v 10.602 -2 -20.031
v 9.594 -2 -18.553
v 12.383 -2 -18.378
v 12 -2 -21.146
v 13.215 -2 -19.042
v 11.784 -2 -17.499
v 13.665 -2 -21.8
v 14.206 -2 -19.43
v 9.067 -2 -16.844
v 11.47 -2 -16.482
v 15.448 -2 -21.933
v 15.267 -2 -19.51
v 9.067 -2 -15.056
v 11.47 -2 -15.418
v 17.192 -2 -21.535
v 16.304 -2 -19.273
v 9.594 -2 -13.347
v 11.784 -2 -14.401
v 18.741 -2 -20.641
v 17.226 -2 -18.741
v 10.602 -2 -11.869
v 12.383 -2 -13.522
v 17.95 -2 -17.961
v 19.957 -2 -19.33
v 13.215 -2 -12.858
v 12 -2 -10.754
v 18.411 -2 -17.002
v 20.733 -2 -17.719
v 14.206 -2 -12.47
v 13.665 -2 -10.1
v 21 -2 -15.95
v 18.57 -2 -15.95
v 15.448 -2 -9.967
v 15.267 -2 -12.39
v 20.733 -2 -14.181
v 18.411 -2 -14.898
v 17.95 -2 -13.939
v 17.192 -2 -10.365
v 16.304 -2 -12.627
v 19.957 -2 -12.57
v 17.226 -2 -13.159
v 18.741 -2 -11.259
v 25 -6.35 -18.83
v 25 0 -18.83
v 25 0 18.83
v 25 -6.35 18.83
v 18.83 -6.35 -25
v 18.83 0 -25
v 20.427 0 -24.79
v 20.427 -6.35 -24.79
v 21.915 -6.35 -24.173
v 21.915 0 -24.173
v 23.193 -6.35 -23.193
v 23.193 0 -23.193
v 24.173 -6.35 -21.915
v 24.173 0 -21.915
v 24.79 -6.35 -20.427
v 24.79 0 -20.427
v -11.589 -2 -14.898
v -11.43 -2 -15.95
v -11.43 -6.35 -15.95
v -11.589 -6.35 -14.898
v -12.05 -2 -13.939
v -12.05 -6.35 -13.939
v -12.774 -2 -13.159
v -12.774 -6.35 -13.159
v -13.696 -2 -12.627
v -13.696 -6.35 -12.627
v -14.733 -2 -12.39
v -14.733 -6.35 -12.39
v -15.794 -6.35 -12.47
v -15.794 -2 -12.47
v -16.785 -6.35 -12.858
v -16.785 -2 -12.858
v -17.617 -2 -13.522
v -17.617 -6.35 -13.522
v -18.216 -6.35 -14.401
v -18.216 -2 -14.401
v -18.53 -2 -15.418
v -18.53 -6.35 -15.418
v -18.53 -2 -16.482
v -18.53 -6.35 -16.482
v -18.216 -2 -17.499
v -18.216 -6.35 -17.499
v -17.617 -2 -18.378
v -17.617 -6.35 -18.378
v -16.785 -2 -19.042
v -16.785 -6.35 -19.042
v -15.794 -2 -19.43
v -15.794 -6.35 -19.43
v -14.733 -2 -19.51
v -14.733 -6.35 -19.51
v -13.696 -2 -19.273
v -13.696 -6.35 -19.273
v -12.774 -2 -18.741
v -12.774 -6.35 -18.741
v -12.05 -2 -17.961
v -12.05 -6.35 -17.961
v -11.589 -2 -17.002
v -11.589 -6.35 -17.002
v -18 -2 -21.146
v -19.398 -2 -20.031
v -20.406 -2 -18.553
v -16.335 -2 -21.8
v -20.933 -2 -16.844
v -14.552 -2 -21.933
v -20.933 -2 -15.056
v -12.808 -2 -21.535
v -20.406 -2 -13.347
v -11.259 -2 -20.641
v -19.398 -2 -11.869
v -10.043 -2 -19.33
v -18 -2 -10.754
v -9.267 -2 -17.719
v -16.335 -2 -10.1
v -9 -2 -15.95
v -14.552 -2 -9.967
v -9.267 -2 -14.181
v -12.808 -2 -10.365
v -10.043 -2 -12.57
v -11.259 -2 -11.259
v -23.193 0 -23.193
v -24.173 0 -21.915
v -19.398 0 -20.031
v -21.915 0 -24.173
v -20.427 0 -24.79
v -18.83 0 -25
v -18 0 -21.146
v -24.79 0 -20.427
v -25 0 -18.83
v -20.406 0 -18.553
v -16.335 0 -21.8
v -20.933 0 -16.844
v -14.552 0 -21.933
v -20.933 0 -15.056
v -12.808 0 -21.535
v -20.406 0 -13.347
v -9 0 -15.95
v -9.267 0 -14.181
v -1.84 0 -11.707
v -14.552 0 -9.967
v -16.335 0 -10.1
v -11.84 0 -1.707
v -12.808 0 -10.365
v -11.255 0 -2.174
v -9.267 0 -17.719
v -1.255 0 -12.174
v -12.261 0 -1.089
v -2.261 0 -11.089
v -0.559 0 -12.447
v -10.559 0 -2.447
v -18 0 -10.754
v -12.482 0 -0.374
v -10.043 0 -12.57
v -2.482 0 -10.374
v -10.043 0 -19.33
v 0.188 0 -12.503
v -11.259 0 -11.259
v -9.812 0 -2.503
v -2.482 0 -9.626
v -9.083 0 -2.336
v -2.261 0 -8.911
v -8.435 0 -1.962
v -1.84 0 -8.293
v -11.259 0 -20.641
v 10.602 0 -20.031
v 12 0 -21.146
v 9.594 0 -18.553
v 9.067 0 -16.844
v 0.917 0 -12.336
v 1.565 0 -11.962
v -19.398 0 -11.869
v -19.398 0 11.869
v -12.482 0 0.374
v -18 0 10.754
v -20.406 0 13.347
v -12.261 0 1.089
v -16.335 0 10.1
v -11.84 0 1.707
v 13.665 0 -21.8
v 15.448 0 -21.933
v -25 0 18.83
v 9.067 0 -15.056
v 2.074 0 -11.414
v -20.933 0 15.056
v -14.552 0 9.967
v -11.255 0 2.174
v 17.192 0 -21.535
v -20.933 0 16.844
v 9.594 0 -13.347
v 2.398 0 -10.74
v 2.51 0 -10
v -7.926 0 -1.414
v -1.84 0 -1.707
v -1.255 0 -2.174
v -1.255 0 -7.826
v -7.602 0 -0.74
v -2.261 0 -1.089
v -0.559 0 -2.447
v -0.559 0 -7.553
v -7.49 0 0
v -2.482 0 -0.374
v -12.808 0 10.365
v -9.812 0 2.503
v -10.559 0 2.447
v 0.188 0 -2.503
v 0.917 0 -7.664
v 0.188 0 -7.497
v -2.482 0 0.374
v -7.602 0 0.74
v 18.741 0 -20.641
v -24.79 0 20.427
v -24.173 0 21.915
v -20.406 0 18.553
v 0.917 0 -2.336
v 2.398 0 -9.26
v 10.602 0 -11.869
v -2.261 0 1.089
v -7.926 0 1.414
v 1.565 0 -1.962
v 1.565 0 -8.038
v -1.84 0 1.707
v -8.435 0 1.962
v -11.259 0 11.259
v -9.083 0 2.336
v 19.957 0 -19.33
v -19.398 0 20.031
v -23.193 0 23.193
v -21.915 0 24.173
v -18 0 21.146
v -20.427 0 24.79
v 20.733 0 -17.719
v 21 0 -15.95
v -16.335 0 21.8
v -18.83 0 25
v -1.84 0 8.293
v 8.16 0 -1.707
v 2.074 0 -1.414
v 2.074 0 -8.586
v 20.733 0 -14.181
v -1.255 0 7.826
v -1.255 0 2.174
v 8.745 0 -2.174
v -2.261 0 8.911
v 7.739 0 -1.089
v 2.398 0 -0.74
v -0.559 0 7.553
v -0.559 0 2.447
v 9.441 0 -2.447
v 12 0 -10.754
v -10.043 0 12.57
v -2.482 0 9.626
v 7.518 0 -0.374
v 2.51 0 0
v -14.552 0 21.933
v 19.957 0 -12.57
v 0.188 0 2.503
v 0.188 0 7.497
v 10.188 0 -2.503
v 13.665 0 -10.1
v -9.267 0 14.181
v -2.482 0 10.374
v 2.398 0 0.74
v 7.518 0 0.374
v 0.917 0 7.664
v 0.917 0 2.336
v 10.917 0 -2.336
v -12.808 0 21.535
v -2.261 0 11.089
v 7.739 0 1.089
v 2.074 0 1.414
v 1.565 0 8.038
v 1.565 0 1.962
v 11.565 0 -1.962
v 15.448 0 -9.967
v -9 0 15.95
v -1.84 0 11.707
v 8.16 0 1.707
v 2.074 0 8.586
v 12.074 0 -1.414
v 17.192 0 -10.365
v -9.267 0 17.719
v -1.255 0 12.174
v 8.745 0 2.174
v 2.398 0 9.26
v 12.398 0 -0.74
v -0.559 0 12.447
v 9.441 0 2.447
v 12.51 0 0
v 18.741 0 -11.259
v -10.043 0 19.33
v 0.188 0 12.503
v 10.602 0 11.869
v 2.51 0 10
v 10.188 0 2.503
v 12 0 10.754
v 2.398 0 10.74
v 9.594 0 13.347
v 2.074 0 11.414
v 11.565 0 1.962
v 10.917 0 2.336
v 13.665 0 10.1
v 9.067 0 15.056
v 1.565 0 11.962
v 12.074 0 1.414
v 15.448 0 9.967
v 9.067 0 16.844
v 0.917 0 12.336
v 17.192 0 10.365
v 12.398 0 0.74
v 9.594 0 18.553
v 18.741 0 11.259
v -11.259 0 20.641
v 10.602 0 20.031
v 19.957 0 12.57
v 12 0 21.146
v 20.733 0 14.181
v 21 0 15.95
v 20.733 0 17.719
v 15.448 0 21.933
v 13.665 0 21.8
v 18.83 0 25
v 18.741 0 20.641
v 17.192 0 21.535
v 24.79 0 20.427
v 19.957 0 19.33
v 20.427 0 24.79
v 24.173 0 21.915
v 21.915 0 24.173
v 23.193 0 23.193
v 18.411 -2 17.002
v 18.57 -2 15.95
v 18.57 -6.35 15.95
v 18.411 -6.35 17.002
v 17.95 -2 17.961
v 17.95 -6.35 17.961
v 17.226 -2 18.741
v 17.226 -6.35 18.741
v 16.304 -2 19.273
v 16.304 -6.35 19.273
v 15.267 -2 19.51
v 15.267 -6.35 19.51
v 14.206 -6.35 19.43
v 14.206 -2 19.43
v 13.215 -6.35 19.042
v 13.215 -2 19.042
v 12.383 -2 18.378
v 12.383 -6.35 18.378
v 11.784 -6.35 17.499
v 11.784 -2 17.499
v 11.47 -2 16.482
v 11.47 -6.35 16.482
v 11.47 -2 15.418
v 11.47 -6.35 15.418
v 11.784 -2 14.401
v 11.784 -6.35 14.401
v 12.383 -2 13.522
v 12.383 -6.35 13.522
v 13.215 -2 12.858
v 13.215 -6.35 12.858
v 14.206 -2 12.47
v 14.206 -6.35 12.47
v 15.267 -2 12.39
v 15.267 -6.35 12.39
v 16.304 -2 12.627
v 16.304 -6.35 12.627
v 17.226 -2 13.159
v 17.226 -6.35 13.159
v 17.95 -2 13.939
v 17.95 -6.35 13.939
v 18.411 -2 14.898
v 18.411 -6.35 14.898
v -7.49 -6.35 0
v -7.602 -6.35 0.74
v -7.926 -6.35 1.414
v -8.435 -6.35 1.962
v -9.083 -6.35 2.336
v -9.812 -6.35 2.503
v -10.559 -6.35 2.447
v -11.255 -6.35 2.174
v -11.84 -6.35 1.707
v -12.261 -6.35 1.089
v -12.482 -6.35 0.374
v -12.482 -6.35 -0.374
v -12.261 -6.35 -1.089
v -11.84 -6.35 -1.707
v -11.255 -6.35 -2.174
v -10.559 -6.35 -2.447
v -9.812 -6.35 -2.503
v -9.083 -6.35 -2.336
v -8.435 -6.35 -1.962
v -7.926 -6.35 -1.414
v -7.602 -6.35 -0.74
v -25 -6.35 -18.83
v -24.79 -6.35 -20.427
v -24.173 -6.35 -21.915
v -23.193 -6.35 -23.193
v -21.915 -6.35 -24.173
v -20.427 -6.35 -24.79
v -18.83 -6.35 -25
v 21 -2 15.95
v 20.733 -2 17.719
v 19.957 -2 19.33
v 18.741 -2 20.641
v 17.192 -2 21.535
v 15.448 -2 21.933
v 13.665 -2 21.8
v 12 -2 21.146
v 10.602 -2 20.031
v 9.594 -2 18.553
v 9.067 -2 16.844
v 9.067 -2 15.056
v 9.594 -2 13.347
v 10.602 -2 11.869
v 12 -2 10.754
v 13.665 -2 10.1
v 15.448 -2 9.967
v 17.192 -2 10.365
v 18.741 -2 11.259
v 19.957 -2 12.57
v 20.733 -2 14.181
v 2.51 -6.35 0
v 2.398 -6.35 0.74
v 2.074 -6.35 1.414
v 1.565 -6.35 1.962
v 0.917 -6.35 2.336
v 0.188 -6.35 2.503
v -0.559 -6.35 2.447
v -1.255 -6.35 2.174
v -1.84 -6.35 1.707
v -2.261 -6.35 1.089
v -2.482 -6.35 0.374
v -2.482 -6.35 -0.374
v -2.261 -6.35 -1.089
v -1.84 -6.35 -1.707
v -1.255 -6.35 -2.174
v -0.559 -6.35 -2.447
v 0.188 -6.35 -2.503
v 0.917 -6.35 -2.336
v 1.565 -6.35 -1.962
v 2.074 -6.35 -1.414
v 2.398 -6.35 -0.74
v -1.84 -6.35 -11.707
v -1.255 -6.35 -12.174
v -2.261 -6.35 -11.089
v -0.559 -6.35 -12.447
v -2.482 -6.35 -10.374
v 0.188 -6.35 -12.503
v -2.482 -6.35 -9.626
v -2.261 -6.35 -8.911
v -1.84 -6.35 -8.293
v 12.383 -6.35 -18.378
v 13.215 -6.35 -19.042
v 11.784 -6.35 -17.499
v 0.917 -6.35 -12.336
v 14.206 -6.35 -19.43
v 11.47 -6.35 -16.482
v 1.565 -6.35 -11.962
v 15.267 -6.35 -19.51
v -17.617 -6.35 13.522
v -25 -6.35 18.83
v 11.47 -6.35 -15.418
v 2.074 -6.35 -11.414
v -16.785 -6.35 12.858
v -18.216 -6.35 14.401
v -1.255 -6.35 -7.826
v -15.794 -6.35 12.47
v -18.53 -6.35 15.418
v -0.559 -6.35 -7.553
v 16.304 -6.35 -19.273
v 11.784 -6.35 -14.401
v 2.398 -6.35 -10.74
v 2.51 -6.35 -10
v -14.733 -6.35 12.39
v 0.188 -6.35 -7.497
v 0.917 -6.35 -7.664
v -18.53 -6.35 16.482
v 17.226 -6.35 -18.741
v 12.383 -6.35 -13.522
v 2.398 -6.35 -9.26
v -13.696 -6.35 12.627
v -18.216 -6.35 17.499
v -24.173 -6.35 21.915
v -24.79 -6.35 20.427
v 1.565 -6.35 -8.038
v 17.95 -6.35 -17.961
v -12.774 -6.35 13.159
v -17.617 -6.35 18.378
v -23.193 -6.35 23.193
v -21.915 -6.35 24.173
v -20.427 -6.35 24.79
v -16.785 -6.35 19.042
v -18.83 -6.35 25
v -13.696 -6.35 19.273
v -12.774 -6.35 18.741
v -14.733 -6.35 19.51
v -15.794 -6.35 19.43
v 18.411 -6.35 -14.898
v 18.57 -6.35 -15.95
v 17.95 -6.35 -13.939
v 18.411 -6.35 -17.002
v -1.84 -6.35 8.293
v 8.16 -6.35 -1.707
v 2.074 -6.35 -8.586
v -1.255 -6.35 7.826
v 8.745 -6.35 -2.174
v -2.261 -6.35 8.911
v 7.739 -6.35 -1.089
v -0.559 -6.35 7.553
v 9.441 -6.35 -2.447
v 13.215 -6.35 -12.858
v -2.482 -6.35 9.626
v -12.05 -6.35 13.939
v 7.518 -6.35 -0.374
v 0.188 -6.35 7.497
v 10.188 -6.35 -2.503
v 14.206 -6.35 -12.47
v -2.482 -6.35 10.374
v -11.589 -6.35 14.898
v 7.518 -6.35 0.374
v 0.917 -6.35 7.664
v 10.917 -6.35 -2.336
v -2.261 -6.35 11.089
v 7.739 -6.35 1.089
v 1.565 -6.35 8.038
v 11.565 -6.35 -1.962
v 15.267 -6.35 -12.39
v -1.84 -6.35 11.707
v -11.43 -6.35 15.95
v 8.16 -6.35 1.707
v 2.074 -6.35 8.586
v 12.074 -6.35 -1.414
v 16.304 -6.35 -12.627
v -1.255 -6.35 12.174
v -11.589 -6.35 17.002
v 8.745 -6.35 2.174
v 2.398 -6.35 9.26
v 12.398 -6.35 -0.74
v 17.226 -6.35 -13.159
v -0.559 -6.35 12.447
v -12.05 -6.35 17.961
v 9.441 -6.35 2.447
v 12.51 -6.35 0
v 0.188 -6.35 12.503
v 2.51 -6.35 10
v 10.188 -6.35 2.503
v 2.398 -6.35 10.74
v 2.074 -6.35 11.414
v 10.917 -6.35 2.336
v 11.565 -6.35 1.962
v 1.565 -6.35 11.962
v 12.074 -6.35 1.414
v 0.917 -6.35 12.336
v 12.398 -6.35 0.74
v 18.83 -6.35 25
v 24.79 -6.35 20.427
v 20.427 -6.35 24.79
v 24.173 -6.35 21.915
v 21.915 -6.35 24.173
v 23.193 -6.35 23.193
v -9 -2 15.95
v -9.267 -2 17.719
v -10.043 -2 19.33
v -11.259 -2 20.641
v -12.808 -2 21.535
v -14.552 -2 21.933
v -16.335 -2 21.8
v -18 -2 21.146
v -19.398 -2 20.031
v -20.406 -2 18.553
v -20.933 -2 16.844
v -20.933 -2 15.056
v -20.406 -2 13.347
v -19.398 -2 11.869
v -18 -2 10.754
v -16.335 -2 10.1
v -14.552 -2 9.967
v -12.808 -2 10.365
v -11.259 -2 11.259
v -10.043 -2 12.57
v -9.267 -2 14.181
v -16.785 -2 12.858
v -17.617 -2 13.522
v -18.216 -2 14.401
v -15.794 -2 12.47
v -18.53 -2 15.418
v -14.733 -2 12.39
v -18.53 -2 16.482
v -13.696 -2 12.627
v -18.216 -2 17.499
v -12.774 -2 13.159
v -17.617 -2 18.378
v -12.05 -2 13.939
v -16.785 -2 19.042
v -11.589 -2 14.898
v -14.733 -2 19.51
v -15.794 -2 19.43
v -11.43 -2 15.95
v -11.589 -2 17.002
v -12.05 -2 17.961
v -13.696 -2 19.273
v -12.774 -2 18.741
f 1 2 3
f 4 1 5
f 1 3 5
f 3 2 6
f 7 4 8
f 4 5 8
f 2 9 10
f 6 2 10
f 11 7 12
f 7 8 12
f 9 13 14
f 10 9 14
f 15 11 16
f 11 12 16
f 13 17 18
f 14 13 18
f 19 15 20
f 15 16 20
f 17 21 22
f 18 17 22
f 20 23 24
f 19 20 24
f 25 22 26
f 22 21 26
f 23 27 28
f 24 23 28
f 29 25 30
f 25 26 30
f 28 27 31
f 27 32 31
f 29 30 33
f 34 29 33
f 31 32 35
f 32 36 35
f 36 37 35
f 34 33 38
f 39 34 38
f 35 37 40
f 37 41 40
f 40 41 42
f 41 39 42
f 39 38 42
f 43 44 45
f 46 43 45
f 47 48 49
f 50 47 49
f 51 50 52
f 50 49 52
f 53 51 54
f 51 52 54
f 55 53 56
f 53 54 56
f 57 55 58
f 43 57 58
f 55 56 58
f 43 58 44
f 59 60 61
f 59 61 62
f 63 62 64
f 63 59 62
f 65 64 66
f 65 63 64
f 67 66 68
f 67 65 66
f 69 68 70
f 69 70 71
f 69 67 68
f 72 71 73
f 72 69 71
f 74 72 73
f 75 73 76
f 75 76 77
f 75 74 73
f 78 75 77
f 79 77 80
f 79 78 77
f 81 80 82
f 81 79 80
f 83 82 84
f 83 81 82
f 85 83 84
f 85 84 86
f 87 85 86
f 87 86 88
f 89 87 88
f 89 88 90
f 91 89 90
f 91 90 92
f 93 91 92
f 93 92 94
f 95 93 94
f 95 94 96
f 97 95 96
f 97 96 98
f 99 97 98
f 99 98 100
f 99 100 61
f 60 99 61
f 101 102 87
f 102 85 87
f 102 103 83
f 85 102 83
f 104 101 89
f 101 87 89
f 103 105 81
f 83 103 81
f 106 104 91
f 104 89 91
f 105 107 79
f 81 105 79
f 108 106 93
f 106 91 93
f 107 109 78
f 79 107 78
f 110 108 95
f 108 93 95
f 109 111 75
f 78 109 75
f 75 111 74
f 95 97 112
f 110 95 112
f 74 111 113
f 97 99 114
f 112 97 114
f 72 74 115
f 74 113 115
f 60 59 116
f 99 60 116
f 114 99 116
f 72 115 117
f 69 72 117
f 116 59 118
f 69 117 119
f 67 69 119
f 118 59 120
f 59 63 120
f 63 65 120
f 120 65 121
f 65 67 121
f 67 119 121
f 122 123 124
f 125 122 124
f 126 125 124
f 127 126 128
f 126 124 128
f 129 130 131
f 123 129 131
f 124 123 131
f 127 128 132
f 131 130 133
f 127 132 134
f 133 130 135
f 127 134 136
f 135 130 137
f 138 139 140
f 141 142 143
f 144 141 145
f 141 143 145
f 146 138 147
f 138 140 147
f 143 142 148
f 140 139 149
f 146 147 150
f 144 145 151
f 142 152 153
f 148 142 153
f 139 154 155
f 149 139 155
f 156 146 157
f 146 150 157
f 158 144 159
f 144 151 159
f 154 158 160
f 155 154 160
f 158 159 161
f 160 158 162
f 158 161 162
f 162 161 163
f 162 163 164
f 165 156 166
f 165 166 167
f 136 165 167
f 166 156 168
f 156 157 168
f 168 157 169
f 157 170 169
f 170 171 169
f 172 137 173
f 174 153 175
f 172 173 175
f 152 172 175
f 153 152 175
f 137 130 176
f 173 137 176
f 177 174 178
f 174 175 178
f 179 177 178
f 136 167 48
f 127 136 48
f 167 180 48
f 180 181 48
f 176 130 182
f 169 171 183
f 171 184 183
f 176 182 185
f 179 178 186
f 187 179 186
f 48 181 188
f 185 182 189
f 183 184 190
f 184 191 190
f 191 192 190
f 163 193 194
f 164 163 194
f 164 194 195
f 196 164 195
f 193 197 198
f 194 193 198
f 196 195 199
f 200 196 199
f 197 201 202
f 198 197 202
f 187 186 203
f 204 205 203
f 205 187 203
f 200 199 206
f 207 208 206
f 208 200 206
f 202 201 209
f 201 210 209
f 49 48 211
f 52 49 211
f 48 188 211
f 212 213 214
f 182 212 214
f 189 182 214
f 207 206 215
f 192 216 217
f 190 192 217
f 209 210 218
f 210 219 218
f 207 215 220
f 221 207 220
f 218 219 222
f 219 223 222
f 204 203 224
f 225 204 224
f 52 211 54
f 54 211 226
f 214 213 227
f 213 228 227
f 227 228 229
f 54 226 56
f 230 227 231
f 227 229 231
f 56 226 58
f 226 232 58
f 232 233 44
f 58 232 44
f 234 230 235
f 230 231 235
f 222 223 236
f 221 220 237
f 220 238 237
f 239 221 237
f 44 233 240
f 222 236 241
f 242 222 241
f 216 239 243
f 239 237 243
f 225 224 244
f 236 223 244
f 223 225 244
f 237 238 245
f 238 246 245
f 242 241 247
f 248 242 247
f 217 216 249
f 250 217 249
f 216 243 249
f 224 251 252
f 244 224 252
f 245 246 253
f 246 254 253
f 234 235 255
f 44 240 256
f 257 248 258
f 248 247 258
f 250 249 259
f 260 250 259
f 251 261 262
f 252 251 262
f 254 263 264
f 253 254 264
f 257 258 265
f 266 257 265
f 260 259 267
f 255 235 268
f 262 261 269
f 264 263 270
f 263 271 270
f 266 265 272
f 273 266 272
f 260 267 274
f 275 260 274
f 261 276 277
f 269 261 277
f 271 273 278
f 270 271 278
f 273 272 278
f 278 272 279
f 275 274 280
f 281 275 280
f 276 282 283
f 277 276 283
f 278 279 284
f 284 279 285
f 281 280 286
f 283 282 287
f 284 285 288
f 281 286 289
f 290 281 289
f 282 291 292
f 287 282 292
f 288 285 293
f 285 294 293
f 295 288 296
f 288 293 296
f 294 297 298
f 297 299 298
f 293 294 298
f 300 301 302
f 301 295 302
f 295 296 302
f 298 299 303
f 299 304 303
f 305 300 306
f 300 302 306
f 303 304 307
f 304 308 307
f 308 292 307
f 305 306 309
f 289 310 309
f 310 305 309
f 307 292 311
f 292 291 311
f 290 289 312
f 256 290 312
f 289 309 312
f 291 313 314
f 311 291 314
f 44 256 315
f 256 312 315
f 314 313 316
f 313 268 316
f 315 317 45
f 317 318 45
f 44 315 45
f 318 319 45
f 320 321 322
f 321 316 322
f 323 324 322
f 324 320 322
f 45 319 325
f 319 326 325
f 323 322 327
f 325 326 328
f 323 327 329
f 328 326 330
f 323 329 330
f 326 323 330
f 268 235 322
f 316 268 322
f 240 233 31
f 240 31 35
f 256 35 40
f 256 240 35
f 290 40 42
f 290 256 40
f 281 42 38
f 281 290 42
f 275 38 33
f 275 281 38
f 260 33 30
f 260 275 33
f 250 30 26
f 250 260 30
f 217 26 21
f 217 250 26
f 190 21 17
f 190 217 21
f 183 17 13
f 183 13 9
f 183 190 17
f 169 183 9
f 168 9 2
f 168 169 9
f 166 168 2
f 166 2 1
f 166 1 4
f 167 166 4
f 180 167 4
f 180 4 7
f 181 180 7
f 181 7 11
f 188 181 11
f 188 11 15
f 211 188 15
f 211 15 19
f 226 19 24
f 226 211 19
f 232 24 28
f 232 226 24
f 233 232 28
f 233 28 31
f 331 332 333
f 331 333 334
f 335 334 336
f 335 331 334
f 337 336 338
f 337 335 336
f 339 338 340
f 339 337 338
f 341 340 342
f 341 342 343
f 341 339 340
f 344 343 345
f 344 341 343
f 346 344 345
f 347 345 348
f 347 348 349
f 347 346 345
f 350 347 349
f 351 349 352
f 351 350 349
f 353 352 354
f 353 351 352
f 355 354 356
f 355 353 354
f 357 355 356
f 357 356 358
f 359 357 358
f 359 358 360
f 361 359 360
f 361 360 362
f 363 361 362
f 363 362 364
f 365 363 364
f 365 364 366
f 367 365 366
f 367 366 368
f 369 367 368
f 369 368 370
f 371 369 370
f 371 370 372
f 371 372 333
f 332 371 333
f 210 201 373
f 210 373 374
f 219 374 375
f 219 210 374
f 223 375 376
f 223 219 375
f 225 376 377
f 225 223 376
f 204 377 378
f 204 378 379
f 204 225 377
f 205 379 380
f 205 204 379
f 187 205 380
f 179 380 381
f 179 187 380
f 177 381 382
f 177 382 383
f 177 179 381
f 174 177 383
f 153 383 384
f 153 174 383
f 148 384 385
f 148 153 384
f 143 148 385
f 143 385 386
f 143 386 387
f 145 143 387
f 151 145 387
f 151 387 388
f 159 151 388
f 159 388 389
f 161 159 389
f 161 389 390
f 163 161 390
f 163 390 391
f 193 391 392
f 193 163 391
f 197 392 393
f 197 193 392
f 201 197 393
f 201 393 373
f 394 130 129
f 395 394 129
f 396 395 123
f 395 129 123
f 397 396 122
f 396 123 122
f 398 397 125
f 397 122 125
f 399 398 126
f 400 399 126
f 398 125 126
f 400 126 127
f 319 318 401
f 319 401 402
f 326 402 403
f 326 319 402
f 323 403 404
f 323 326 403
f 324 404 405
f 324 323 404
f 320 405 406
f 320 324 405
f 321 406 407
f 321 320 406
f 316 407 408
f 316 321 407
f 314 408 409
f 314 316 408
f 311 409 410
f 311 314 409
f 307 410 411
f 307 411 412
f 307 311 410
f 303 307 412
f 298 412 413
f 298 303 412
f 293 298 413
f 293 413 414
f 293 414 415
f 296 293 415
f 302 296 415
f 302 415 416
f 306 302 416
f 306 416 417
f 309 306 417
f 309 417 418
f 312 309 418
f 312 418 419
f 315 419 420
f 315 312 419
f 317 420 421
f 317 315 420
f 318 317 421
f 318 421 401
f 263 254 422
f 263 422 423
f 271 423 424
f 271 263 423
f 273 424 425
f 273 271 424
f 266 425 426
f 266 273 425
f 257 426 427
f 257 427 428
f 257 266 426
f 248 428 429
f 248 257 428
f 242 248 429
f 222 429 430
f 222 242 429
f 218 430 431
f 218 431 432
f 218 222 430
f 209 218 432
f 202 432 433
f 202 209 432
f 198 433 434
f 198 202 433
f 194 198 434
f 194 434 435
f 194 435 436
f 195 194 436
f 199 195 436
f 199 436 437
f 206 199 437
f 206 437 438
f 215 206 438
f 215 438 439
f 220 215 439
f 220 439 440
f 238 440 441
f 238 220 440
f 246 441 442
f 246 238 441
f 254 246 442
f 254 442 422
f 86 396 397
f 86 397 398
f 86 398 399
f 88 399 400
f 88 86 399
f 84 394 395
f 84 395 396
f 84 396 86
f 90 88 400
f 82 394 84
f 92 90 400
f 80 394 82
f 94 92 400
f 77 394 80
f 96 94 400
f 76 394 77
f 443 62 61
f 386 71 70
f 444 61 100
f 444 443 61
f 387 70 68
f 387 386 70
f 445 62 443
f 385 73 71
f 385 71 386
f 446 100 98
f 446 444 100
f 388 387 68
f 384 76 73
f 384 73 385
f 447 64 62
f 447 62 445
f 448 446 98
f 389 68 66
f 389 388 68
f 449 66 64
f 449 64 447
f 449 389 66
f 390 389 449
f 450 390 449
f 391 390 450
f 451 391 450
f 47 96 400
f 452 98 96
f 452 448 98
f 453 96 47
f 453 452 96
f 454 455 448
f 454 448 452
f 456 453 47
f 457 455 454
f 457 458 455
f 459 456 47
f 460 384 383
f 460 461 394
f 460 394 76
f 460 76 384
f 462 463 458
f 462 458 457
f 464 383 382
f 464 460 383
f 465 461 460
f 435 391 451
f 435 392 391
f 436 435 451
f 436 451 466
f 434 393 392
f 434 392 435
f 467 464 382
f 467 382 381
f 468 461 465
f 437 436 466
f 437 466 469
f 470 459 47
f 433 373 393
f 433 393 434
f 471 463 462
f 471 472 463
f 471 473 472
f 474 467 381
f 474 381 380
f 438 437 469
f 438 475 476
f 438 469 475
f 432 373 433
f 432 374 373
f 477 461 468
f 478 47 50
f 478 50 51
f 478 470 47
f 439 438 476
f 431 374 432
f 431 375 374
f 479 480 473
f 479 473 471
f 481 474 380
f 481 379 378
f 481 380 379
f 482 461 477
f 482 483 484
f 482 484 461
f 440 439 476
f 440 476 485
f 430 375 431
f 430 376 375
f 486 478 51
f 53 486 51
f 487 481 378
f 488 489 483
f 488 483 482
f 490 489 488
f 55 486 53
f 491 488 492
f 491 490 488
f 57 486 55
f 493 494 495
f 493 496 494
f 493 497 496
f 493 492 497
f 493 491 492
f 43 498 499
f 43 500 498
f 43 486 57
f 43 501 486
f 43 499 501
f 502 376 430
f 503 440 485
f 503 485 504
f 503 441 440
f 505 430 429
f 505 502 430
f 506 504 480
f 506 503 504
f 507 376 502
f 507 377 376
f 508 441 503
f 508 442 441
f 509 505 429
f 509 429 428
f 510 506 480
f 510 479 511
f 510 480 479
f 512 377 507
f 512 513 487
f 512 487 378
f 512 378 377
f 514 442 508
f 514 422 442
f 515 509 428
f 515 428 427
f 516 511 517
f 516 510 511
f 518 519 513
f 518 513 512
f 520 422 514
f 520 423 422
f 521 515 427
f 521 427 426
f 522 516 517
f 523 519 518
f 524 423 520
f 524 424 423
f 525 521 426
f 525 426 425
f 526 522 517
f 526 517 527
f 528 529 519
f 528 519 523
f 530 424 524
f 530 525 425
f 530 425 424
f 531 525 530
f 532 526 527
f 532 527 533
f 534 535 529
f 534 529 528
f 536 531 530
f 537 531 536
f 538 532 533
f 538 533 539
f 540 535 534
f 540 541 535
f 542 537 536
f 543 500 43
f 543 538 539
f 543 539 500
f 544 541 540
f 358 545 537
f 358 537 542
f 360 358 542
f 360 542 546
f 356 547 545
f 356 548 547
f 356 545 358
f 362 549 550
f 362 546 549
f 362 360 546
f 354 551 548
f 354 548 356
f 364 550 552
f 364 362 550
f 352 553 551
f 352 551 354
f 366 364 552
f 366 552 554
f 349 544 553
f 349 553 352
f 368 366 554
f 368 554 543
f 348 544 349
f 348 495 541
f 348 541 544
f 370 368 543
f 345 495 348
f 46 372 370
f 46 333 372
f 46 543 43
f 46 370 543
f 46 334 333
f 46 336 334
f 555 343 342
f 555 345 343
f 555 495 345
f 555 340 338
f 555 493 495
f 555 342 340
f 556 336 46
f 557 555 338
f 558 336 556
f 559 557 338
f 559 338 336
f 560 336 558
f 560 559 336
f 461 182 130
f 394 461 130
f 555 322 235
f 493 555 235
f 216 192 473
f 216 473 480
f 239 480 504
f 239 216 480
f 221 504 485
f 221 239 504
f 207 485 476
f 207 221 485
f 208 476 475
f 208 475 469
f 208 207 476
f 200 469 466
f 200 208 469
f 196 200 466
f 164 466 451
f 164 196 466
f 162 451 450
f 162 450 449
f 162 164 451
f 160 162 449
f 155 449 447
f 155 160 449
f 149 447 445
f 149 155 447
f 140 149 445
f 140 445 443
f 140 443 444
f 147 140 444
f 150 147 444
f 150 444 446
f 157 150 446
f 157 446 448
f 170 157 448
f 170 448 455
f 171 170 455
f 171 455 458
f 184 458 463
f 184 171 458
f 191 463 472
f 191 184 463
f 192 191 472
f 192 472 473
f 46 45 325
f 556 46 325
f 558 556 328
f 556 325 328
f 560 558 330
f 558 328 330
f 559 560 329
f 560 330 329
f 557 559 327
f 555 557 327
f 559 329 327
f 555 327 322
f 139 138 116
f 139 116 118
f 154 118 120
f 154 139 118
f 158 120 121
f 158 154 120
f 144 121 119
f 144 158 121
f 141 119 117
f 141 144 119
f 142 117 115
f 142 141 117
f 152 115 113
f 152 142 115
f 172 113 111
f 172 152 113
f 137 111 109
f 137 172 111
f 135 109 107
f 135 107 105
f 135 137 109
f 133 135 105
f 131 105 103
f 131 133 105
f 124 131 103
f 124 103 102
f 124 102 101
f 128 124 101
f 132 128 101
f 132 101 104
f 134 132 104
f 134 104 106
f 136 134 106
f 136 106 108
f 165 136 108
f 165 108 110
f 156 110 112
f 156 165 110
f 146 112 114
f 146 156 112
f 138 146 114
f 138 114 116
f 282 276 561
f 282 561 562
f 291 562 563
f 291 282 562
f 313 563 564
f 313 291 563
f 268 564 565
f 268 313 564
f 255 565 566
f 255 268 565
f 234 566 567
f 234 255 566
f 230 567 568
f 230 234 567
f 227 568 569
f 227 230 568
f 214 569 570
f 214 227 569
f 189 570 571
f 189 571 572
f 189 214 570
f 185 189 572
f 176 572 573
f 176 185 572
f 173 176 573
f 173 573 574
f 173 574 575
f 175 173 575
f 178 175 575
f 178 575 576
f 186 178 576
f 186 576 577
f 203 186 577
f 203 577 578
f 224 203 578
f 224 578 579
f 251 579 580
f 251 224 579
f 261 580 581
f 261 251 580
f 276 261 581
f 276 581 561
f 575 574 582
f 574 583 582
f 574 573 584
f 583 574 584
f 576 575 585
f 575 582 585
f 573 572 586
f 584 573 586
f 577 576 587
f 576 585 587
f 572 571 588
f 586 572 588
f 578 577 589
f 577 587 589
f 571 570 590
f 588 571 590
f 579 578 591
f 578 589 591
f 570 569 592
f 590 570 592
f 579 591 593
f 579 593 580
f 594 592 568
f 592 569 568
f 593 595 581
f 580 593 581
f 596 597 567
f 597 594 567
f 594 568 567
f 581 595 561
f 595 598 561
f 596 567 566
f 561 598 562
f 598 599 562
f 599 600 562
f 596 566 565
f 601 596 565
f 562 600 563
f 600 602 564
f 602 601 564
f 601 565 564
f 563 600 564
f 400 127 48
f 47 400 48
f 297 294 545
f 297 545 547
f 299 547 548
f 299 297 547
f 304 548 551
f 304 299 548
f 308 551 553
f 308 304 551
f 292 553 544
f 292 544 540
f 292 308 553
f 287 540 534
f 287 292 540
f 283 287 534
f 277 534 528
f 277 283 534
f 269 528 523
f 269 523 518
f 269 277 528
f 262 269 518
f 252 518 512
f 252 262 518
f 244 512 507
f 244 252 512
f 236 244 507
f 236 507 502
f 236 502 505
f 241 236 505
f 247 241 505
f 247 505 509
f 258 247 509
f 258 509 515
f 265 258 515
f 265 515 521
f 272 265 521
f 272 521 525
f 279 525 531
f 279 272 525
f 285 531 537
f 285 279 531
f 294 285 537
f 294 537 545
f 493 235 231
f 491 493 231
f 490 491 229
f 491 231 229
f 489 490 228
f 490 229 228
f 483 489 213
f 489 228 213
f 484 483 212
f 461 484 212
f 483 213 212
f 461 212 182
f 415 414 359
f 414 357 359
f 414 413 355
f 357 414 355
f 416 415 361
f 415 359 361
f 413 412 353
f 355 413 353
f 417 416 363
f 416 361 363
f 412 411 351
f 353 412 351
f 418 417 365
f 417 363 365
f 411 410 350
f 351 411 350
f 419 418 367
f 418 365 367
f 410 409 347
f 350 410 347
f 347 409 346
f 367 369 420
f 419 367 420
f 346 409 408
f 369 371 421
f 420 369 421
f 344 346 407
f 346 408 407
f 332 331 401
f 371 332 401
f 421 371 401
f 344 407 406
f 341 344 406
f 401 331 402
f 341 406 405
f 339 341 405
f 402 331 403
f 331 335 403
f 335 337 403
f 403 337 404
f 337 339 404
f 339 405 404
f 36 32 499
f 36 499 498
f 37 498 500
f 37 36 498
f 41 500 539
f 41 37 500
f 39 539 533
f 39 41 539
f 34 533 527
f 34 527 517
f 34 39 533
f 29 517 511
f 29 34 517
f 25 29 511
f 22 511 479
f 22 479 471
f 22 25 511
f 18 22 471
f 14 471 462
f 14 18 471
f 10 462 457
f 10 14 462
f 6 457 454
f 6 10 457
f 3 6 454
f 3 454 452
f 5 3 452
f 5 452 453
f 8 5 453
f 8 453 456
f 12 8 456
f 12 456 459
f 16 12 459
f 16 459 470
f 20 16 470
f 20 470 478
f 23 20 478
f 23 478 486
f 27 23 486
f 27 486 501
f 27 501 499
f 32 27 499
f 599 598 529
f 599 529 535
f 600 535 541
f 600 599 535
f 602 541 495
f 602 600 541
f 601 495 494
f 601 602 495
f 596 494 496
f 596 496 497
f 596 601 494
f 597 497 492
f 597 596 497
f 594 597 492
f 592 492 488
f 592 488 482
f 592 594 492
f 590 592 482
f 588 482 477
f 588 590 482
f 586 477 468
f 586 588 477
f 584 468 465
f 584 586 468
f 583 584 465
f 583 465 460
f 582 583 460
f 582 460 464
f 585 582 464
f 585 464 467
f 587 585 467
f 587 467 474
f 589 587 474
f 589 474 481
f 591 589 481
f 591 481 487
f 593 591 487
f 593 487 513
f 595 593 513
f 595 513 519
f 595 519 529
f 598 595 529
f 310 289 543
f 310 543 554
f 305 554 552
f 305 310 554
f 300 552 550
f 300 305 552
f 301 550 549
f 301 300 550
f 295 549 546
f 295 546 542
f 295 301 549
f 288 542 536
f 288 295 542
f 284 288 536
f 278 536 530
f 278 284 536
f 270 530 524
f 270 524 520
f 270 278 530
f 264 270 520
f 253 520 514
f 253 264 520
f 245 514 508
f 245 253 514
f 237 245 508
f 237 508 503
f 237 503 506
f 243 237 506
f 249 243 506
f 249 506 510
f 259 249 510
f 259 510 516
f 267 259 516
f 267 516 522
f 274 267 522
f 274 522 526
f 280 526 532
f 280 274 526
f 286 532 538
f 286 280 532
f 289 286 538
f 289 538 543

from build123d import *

# Parameters (mm, degrees)
F0_R     = 6
F0_R_2   = 2.51
F0_R_3   = 3.57
F1_DEPTH = 6.35
F2_DEPTH = 2


with BuildPart() as f1:
    # F0 (on Front) → F1 (new body)
    with BuildSketch(Plane.XZ):
        with BuildLine():
            Line((-18.83, -25), (18.83, -25))
            ThreePointArc((18.83, -25), (23.192849, -23.192849), (25, -18.83))
            Line((25, -18.83), (25, 18.83))
            ThreePointArc((25, 18.83), (23.192849, 23.192849), (18.83, 25))
            Line((18.83, 25), (-18.83, 25))
            ThreePointArc((-18.83, 25), (-23.192849, 23.192849), (-25, 18.83))
            Line((-25, 18.83), (-25, -18.83))
            ThreePointArc((-25, -18.83), (-23.192849, -23.192849), (-18.83, -25))
        make_face()
        with Locations((-14.999998, -15.950001)):
            Circle(F0_R, mode=Mode.SUBTRACT)
        with Locations((14.999999, -15.95)):
            Circle(F0_R, mode=Mode.SUBTRACT)
        with Locations((0, -10)):
            Circle(F0_R_2, mode=Mode.SUBTRACT)
        with Locations((-10, 0)):
            Circle(F0_R_2, mode=Mode.SUBTRACT)
        with Locations((-1e-06, 10)):
            Circle(F0_R_2, mode=Mode.SUBTRACT)
        with Locations((-15.000001, 15.949999)):
            Circle(F0_R, mode=Mode.SUBTRACT)
        Circle(F0_R_2, mode=Mode.SUBTRACT)
        with Locations((10, 0)):
            Circle(F0_R_2, mode=Mode.SUBTRACT)
        with Locations((14.999999, 15.95)):
            Circle(F0_R, mode=Mode.SUBTRACT)
        with Locations((-15.000001, 15.949999)):
            Circle(F0_R)
        with Locations((-15.000001, 15.949999)):
            Circle(F0_R_3, mode=Mode.SUBTRACT)
        with Locations((14.999999, 15.95)):
            Circle(F0_R)
        with Locations((14.999999, 15.95)):
            Circle(F0_R_3, mode=Mode.SUBTRACT)
        with Locations((14.999999, -15.95)):
            Circle(F0_R)
        with Locations((14.999999, -15.95)):
            Circle(F0_R_3, mode=Mode.SUBTRACT)
        with Locations((-14.999998, -15.950001)):
            Circle(F0_R)
        with Locations((-14.999998, -15.950001)):
            Circle(F0_R_3, mode=Mode.SUBTRACT)
    extrude(amount=F1_DEPTH)

    # F0 (on Front) → F2 (cut)
    with BuildSketch(Plane.XZ):
        with Locations((14.999999, 15.95)):
            Circle(F0_R)
        with Locations((14.999999, 15.95)):
            Circle(F0_R_3, mode=Mode.SUBTRACT)
        with Locations((-15.000001, 15.949999)):
            Circle(F0_R)
        with Locations((-15.000001, 15.949999)):
            Circle(F0_R_3, mode=Mode.SUBTRACT)
        with Locations((-14.999998, -15.950001)):
            Circle(F0_R)
        with Locations((-14.999998, -15.950001)):
            Circle(F0_R_3, mode=Mode.SUBTRACT)
        with Locations((14.999999, -15.95)):
            Circle(F0_R)
        with Locations((14.999999, -15.95)):
            Circle(F0_R_3, mode=Mode.SUBTRACT)
    extrude(amount=F2_DEPTH, mode=Mode.SUBTRACT)


solid = f1.part
